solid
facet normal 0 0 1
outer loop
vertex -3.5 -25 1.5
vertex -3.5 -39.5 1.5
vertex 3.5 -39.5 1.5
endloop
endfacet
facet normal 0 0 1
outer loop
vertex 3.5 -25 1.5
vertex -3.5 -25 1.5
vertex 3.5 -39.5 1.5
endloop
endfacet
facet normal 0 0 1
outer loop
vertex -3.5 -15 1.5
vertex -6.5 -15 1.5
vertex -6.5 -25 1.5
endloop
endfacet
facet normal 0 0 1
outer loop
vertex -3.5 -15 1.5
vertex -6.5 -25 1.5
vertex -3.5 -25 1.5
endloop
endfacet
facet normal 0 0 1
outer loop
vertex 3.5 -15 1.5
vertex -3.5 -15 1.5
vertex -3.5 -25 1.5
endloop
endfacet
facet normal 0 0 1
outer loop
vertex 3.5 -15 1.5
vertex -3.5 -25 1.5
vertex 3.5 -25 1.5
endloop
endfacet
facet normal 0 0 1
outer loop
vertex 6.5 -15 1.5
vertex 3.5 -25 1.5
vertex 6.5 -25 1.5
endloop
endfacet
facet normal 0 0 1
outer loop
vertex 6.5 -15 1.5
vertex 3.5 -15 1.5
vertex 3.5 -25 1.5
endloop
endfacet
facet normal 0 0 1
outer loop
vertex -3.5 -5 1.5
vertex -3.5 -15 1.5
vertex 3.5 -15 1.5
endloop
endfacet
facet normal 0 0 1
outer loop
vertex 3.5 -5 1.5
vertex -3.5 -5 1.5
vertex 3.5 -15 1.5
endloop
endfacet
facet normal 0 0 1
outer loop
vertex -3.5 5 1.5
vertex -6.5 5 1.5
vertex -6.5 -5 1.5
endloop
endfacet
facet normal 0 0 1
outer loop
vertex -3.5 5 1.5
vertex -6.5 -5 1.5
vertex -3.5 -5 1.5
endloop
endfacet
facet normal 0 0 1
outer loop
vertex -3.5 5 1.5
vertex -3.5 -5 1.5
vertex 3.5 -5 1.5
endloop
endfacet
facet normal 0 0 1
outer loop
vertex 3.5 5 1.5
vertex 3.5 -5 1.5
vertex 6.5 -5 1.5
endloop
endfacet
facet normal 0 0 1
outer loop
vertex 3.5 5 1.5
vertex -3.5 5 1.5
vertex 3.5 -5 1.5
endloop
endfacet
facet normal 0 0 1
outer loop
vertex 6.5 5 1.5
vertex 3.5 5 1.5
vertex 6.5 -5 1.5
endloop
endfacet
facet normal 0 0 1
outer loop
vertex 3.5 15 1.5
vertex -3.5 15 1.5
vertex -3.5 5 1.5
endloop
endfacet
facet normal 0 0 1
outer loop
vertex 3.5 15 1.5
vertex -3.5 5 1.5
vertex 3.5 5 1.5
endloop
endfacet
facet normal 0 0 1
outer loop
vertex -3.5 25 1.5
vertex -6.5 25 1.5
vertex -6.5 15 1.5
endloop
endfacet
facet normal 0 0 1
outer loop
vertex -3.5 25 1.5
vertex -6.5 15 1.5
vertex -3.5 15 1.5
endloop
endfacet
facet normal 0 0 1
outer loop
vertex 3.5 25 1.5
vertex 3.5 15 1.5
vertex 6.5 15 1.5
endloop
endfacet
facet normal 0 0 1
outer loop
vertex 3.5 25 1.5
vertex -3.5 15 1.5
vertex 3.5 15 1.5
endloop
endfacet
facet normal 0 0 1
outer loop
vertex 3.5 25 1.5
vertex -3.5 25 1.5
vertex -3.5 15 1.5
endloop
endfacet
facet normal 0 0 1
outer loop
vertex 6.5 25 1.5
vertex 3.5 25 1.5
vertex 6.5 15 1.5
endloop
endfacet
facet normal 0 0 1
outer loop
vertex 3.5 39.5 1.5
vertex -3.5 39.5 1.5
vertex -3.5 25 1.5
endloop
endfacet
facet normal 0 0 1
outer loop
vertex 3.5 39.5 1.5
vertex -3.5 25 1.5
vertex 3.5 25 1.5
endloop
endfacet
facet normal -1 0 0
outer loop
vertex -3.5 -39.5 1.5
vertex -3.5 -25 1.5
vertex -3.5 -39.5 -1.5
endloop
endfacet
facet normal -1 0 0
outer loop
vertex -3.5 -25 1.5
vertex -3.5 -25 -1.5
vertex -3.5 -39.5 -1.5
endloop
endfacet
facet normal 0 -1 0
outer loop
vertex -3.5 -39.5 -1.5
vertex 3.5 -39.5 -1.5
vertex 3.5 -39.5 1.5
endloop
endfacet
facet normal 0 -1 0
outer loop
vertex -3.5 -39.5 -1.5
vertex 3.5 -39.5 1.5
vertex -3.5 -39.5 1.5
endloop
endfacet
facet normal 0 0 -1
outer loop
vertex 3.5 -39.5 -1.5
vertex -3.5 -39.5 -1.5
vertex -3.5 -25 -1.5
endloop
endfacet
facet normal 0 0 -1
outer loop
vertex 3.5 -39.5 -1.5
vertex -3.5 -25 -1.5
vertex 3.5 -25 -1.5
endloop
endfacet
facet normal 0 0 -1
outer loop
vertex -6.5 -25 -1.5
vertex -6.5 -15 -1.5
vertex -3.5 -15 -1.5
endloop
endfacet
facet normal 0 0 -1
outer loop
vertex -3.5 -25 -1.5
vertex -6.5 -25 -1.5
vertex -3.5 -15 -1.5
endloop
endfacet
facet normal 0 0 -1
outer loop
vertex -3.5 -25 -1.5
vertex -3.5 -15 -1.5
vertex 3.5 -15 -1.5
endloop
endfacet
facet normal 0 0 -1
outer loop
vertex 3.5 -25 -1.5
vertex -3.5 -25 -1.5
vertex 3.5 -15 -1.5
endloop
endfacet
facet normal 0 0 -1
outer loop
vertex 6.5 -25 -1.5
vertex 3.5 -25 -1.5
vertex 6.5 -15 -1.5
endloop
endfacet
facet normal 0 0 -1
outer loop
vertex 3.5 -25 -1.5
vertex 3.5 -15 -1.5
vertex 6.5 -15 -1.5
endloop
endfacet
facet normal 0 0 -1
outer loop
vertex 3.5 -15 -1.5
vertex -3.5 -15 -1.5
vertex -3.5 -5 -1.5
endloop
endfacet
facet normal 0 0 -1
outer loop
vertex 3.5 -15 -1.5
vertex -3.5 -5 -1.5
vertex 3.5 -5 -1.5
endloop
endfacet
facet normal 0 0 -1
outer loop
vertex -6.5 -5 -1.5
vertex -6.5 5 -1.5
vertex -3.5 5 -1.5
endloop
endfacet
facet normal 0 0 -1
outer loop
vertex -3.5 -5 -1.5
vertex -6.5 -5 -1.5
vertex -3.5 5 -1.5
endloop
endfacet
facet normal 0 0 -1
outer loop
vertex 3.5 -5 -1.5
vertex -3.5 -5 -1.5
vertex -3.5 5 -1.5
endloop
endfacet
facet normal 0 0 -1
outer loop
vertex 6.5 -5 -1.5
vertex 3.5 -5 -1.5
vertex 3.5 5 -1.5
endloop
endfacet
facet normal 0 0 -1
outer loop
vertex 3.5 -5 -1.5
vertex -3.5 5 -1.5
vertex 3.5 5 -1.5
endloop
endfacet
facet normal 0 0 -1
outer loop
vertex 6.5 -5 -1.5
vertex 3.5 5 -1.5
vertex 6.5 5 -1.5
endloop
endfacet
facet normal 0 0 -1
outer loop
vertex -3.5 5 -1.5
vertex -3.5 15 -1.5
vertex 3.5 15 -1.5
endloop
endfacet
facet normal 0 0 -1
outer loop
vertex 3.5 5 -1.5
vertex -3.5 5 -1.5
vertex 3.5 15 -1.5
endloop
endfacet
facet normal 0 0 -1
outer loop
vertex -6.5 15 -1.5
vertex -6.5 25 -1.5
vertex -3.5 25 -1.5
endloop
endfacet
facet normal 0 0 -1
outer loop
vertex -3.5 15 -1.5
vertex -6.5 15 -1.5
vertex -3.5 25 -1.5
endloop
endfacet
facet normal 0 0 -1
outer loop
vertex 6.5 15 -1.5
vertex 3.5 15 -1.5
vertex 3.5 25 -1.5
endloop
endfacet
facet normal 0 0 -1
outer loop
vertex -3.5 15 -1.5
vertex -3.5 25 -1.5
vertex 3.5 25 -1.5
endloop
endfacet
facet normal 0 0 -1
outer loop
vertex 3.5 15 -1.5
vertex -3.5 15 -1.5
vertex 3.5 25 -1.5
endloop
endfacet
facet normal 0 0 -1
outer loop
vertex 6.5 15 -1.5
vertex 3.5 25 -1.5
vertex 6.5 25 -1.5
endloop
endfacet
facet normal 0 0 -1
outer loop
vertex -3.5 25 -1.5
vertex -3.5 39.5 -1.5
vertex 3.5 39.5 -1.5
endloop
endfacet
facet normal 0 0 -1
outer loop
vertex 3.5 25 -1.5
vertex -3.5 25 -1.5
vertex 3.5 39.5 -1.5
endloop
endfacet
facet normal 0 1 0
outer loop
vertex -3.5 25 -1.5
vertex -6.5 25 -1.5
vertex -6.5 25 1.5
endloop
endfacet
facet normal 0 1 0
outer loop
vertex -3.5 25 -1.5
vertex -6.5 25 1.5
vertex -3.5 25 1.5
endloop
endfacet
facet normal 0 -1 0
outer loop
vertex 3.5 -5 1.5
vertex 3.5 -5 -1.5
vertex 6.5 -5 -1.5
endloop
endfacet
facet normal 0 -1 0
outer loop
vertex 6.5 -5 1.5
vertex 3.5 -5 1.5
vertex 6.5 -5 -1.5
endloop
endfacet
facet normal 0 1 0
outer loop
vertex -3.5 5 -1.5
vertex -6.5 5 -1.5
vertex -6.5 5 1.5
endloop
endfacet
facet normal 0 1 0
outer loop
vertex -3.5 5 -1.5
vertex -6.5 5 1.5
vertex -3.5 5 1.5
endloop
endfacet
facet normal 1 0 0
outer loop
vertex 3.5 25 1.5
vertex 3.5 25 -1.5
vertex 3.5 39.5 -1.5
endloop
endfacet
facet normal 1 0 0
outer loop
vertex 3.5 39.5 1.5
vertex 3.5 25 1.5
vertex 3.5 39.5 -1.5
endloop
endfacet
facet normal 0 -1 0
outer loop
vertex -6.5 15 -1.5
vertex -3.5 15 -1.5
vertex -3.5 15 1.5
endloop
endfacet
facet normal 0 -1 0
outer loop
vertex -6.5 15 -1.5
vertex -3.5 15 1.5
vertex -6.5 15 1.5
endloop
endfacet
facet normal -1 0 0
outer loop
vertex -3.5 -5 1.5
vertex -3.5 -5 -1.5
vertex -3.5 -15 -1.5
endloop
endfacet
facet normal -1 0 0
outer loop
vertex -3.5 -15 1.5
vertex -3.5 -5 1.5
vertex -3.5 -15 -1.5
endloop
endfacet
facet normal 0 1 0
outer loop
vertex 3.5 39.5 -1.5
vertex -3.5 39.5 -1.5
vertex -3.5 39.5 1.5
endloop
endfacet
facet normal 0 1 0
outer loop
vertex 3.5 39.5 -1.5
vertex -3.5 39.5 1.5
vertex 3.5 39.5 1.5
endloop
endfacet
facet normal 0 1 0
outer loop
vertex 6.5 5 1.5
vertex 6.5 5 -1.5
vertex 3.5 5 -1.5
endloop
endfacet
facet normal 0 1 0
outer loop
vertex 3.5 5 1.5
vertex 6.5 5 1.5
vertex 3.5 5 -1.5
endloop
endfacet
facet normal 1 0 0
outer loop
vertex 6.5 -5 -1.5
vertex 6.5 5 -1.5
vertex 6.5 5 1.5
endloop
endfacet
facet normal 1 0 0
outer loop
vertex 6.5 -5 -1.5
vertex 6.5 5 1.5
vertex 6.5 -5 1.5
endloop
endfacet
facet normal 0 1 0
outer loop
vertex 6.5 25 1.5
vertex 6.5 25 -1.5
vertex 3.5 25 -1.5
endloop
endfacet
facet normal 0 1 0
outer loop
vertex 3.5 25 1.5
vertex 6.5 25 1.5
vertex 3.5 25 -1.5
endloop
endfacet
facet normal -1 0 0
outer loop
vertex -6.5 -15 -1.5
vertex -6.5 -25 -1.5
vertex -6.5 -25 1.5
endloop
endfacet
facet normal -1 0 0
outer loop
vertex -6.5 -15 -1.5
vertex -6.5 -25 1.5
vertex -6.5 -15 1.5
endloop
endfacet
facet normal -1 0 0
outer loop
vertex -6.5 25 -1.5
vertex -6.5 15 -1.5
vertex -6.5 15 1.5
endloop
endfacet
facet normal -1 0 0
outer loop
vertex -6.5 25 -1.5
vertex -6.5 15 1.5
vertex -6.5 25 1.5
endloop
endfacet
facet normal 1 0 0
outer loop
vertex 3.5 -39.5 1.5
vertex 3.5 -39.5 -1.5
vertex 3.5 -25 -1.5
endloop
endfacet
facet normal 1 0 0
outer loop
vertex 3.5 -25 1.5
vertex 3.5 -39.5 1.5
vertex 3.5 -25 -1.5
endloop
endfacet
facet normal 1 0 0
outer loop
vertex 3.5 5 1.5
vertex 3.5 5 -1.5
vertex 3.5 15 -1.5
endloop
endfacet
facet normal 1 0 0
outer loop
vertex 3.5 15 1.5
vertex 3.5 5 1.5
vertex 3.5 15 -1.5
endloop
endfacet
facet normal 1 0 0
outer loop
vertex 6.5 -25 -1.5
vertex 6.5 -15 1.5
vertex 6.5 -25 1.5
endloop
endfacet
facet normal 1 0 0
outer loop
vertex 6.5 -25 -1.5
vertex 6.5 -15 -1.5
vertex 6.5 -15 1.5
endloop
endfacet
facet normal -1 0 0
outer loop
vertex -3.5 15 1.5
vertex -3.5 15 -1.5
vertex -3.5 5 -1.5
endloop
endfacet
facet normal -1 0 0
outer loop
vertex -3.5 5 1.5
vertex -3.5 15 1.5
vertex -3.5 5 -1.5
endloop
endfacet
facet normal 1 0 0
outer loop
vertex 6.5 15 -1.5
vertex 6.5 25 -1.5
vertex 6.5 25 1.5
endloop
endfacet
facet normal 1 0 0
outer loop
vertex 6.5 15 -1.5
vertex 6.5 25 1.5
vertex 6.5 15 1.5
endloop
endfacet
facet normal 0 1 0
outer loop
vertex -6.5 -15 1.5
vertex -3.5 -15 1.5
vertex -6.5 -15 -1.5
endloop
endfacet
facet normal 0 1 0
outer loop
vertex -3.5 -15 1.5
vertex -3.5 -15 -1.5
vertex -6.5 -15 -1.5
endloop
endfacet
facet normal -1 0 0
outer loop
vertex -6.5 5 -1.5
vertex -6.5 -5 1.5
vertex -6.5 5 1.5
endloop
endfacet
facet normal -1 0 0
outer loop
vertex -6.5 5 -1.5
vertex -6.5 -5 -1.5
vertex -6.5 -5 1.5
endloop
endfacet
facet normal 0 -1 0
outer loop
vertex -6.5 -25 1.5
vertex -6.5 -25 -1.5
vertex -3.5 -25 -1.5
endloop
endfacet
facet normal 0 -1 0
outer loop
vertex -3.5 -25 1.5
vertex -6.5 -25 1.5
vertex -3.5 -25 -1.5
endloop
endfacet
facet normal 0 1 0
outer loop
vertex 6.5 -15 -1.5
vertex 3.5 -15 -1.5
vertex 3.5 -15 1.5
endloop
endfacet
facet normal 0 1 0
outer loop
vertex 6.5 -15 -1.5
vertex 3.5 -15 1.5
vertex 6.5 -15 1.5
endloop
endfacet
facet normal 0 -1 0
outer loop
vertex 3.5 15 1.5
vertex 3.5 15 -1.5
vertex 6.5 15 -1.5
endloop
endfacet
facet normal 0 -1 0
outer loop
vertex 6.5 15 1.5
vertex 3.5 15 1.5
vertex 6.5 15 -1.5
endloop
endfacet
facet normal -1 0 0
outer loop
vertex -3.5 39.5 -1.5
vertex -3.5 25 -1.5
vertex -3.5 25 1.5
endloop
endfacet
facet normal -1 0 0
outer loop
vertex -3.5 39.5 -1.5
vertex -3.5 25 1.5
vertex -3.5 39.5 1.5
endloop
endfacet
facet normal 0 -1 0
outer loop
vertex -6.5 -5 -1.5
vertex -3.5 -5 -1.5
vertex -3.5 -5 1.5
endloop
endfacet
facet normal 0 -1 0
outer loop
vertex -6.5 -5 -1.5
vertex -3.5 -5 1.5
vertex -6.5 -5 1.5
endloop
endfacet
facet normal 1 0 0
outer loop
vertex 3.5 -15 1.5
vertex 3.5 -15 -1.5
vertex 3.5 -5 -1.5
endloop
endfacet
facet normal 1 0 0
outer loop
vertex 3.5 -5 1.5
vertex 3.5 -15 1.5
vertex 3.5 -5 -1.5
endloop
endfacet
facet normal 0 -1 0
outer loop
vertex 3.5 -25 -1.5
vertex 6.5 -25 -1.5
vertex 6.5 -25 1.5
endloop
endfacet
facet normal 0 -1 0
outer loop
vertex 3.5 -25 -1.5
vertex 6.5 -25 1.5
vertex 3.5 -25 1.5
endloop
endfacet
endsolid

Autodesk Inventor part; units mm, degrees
ref_plane "YZ Plane" through (0, 0, 0) normal (1, 0, 0) x (0, 1, 0)
ref_plane "XZ Plane" through (0, 0, 0) normal (0, 1, 0) x (-1, 0, 0)
ref_plane "XY Plane" through (0, 0, 0) normal (0, 0, 1) x (1, 0, 0)
sketch "Sketch1" plane through (0, 0, 0) normal (0, 0, 1) x (1, 0, 0)
  line L0 (-6.5, 39.5) -> (6.5, 39.5)
  line L1 (6.5, 39.5) -> (6.5, -39.5)
  line L2 (6.5, -39.5) -> (-6.5, -39.5)
  line L3 (-6.5, -39.5) -> (-6.5, 39.5)
  line L4 (-1.5, 39.5) -> (1.5, 39.5)
  line L5 (1.5, 39.5) -> (1.5, 36.5)
  line L6 (1.5, 36.5) -> (-1.5, 36.5)
  line L7 (-1.5, 36.5) -> (-1.5, 39.5)
  line L8 (-6.5, 5) -> (-3.5, 5)
  line L9 (-3.5, 5) -> (-3.5, -5)
  line L10 (-3.5, -5) -> (-6.5, -5)
  line L11 (-6.5, -5) -> (-6.5, 5)
  line L12 (2.5, 39.5) -> (6.5, 39.5)
  line L13 (6.5, 39.5) -> (6.5, -39.5)
  line L14 (6.5, -39.5) -> (2.5, -39.5)
  line L15 (2.5, -39.5) -> (2.5, 39.5) construction
  line L16 (2.5, 15) -> (-6.5, 15)
  line L17 (-6.5, 15) -> (-6.5, 25)
  line L18 (-6.5, 25) -> (2.5, 25)
  line L19 (2.5, 25) -> (2.5, 15)
  line L20 (0, 0) -> (2.358, 0)
  line L21 (2.5, -15) -> (-6.5, -15)
  line L22 (-6.5, -25) -> (2.5, -25)
  line L23 (0, 0) -> (0, 1.2085)
  line L24 (6.5, 5) -> (3.5, 5)
  line L25 (3.5, -5) -> (6.5, -5)
  line L26 (-2.5, 15) -> (6.5, 15)
  line L27 (6.5, 25) -> (-2.5, 25)
  line L28 (-2.5, -15) -> (6.5, -15)
  line L29 (6.5, -25) -> (-2.5, -25)
  line L30 (-3.5, -15) -> (-3.5, -25)
  line L31 (-3.5, 15) -> (-3.5, 25)
  line L32 (3.5, -5) -> (3.5, 5)
  line L33 (3.5, 15) -> (3.5, 25)
  line L34 (3.5, -25) -> (3.5, -15)
  line L35 (-3.5, 25) -> (-3.5, 39.5)
  line L36 (-3.5, 15) -> (-3.5, -39.5)
  line L37 (3.5, -39.5) -> (3.5, 39.5)
  point P0 (0, 39.5)
  point P1 (0, 36.5)
  point P2 (-3.5, 0)
  point P3 (6.5, 0)
  point P4 (-5, 5)
  point P5 (-2, 15)
  point P6 (-2, -15)
  point P7 (5, 5)
  point P8 (2, 15)
  point P9 (2, -15)
  point P10 (-6.5, -25)
  point P11 (2.5, -25)
  point P12 (6.5, -25)
  point P13 (6.5, -25)
  point P14 (6.5, -15)
  point P15 (6.5, -15)
  point P16 (6.5, -5)
  point P17 (6.5, -5)
  point P18 (6.5, 5)
  point P19 (6.5, 5)
  point P20 (6.5, 15)
  point P21 (6.5, 15)
  point P22 (6.5, 25)
  point P23 (6.5, 25)
  point P24 (2.5, 25)
  point P25 (-6.5, 15)
  point P26 (-2, 5)
  point P27 (-6.5, -5)
  point P28 (-2, -5)
  point P29 (2.5, -15)
  point P30 (-6.5, -15)
  point P31 (-3.5, -15)
  point P32 (-3.5, -25)
  point P33 (3.5, -25)
  point P34 (3.5, -15)
  point P35 (3.5, 15)
  point P36 (3.5, 25)
  dimension "d0" = 79
  dimension "d1" = 13
  dimension "d2" = 3
  dimension "d3" = 3
  dimension "d4" = 3
  dimension "d5" = 10
  dimension "d6" = 4
  dimension "d7" = 10
  dimension "d11" = 10
extrude "Extrusion1" add sketch "Sketch1" along normal mid plane 3 contours L0 L7 L6 L5 L37 L27 L18 L35 | L18 L31 L16 L3 | L0 L5 L6 L7 | L18 L19 L16 L31 | L16 L26 L37 L32 L28 L21 L36 L9 | L8 L9 L10 L3 | L27 L33 L26 L19 | L27 L1 L26 L33 | L21 L30 L22 L3 | L21 L28 L34 L29 L22 L30 | L24 L1 L25 L32 | L22 L29 L37 L2 L36 | L28 L1 L29 L34
equation "\"d11\" = d7"
properties part number "Side piece 2x"
